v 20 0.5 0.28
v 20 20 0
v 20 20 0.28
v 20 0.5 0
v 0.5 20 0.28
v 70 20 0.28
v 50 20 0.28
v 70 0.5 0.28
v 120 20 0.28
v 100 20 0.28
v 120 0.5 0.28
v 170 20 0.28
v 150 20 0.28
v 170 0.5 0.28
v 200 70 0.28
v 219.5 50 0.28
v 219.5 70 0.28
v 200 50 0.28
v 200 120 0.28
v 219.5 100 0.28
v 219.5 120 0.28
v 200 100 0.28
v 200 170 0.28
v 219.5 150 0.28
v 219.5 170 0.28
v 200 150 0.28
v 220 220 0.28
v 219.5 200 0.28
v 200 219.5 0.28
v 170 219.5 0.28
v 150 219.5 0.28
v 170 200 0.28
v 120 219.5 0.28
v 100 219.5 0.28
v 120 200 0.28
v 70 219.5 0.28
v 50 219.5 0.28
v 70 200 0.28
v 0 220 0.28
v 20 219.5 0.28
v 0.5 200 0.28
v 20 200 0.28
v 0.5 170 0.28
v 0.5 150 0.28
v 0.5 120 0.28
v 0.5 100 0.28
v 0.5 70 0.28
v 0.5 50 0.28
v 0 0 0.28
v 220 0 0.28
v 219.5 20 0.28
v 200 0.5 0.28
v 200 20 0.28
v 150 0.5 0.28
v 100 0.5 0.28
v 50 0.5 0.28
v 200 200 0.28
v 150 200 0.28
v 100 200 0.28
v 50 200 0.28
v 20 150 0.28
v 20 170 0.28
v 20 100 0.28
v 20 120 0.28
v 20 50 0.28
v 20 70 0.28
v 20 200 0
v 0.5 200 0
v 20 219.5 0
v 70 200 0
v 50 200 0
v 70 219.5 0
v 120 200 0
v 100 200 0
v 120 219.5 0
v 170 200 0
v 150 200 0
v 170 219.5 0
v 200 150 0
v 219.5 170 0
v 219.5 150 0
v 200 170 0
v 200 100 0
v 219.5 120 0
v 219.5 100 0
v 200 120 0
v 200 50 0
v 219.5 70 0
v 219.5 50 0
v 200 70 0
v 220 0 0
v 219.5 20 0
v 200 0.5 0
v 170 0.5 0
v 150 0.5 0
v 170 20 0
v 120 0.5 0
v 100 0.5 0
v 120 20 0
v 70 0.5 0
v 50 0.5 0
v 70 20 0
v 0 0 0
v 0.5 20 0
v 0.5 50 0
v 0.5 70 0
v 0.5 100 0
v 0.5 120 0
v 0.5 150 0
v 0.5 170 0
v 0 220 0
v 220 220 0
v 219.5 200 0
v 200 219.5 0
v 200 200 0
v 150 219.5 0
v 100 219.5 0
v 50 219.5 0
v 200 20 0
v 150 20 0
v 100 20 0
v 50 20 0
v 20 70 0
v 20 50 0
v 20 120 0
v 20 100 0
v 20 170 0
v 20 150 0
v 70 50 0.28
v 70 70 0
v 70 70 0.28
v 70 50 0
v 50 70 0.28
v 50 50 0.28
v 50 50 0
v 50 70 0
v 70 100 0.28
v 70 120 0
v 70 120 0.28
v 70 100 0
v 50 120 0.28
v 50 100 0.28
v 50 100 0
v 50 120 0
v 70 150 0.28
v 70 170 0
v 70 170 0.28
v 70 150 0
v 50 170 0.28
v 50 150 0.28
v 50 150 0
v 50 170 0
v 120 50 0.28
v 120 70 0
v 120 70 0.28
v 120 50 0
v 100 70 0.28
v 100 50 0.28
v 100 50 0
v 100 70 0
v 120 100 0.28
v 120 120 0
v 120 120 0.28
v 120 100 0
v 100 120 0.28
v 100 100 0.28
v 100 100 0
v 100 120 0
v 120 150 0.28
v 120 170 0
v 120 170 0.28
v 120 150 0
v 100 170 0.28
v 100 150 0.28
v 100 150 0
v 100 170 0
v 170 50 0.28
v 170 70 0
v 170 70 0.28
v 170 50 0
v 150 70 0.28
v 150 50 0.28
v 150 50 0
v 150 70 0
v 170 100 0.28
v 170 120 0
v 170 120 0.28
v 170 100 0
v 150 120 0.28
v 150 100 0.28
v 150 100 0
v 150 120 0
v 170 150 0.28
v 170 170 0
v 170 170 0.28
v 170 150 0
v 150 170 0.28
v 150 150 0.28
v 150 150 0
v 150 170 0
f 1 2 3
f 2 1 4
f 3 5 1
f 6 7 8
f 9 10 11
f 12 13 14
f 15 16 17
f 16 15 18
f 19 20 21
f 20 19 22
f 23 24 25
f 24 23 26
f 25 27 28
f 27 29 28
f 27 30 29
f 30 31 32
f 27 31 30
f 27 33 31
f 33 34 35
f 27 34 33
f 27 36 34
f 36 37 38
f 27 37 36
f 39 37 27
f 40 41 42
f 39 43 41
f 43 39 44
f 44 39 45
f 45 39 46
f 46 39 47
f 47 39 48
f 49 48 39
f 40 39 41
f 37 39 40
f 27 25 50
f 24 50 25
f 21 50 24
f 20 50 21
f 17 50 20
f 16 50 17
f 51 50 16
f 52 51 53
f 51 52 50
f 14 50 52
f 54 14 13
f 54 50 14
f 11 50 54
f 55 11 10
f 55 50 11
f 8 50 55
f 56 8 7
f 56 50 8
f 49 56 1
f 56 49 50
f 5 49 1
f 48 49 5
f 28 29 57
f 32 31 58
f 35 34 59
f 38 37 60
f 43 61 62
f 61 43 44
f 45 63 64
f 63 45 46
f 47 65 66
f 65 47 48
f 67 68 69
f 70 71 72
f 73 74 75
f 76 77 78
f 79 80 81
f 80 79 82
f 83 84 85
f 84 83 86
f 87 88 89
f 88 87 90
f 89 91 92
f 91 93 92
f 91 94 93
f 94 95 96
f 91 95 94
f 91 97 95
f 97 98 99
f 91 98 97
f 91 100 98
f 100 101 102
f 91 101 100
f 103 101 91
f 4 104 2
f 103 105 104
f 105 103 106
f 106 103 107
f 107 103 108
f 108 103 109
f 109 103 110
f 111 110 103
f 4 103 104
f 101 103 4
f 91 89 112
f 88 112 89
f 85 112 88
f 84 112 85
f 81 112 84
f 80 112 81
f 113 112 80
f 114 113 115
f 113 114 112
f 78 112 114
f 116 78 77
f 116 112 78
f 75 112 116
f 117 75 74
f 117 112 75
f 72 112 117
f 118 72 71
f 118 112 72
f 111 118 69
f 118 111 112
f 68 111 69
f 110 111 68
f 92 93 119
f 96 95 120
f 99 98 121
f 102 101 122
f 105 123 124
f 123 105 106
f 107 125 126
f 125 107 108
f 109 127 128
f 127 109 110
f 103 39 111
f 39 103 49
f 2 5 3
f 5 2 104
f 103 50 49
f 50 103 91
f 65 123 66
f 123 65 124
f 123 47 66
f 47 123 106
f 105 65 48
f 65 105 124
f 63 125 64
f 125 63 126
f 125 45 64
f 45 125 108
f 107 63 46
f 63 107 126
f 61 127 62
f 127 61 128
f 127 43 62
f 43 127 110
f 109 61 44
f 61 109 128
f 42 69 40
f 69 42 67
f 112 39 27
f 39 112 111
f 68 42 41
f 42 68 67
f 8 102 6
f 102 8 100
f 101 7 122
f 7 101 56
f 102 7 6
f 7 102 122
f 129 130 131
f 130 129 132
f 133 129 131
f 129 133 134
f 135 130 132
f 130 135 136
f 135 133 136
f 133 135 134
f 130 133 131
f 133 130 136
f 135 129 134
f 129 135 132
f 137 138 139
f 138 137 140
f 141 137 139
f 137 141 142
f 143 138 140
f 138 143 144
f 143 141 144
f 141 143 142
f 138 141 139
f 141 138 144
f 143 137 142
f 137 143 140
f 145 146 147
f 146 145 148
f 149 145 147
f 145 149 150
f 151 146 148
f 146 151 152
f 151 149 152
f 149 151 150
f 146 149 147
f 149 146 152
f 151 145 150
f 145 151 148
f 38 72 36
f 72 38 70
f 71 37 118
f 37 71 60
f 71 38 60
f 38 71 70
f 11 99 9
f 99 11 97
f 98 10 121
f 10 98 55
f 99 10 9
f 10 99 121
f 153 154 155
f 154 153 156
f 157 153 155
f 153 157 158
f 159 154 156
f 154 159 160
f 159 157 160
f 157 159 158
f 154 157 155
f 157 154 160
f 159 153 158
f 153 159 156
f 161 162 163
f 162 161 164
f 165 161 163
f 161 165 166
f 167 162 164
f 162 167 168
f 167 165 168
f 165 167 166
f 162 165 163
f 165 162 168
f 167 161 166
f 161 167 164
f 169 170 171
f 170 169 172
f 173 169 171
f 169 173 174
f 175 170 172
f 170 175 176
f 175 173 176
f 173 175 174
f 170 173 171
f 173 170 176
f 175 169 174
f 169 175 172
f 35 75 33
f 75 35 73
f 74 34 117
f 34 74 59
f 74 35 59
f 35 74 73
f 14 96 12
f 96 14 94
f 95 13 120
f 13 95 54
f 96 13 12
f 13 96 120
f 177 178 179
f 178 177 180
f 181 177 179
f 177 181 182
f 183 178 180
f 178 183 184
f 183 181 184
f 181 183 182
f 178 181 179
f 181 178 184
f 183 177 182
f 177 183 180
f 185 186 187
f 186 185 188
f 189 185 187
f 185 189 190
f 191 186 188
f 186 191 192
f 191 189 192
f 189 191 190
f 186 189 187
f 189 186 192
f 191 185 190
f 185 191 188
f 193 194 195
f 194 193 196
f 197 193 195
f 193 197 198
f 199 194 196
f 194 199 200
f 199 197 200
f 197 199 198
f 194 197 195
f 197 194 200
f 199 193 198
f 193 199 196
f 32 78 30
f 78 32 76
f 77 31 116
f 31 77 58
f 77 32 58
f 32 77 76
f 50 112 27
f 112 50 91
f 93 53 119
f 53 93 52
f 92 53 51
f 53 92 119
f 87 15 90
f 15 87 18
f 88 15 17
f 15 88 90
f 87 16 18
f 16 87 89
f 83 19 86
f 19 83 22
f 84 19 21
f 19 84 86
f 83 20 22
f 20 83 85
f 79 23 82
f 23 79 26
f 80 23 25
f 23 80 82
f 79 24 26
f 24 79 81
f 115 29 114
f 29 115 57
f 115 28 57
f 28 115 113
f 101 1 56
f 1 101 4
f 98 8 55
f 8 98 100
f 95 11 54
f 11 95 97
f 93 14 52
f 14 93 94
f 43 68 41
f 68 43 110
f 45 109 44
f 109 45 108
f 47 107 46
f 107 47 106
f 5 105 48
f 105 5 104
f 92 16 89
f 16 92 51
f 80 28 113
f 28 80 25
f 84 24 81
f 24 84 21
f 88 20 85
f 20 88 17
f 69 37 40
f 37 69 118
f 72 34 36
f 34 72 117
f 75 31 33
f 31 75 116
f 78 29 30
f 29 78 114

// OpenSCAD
//cube([40, 40, .2]);
//translate([50, 0, 0]) cube([40, 40, .2]);

height = .28;

module legs() {
cube([220, .5, height]);
cube([.5, 220, height]);
}

for (i = [0 : 5 : 20]) {
translate([10*i, 0, 0]) cube([20, 20, height]);
for (j = [0 : 5 : 20]) {
translate([10*i, 10*j, 0]) cube([20, 20, height]);
}
}

legs();
translate([220, 0, 0]) mirror([1, 0, 0]) legs();
translate([0, 220, 0]) mirror([0, 1, 0]) legs();

//color("red", .2) cube(220);
